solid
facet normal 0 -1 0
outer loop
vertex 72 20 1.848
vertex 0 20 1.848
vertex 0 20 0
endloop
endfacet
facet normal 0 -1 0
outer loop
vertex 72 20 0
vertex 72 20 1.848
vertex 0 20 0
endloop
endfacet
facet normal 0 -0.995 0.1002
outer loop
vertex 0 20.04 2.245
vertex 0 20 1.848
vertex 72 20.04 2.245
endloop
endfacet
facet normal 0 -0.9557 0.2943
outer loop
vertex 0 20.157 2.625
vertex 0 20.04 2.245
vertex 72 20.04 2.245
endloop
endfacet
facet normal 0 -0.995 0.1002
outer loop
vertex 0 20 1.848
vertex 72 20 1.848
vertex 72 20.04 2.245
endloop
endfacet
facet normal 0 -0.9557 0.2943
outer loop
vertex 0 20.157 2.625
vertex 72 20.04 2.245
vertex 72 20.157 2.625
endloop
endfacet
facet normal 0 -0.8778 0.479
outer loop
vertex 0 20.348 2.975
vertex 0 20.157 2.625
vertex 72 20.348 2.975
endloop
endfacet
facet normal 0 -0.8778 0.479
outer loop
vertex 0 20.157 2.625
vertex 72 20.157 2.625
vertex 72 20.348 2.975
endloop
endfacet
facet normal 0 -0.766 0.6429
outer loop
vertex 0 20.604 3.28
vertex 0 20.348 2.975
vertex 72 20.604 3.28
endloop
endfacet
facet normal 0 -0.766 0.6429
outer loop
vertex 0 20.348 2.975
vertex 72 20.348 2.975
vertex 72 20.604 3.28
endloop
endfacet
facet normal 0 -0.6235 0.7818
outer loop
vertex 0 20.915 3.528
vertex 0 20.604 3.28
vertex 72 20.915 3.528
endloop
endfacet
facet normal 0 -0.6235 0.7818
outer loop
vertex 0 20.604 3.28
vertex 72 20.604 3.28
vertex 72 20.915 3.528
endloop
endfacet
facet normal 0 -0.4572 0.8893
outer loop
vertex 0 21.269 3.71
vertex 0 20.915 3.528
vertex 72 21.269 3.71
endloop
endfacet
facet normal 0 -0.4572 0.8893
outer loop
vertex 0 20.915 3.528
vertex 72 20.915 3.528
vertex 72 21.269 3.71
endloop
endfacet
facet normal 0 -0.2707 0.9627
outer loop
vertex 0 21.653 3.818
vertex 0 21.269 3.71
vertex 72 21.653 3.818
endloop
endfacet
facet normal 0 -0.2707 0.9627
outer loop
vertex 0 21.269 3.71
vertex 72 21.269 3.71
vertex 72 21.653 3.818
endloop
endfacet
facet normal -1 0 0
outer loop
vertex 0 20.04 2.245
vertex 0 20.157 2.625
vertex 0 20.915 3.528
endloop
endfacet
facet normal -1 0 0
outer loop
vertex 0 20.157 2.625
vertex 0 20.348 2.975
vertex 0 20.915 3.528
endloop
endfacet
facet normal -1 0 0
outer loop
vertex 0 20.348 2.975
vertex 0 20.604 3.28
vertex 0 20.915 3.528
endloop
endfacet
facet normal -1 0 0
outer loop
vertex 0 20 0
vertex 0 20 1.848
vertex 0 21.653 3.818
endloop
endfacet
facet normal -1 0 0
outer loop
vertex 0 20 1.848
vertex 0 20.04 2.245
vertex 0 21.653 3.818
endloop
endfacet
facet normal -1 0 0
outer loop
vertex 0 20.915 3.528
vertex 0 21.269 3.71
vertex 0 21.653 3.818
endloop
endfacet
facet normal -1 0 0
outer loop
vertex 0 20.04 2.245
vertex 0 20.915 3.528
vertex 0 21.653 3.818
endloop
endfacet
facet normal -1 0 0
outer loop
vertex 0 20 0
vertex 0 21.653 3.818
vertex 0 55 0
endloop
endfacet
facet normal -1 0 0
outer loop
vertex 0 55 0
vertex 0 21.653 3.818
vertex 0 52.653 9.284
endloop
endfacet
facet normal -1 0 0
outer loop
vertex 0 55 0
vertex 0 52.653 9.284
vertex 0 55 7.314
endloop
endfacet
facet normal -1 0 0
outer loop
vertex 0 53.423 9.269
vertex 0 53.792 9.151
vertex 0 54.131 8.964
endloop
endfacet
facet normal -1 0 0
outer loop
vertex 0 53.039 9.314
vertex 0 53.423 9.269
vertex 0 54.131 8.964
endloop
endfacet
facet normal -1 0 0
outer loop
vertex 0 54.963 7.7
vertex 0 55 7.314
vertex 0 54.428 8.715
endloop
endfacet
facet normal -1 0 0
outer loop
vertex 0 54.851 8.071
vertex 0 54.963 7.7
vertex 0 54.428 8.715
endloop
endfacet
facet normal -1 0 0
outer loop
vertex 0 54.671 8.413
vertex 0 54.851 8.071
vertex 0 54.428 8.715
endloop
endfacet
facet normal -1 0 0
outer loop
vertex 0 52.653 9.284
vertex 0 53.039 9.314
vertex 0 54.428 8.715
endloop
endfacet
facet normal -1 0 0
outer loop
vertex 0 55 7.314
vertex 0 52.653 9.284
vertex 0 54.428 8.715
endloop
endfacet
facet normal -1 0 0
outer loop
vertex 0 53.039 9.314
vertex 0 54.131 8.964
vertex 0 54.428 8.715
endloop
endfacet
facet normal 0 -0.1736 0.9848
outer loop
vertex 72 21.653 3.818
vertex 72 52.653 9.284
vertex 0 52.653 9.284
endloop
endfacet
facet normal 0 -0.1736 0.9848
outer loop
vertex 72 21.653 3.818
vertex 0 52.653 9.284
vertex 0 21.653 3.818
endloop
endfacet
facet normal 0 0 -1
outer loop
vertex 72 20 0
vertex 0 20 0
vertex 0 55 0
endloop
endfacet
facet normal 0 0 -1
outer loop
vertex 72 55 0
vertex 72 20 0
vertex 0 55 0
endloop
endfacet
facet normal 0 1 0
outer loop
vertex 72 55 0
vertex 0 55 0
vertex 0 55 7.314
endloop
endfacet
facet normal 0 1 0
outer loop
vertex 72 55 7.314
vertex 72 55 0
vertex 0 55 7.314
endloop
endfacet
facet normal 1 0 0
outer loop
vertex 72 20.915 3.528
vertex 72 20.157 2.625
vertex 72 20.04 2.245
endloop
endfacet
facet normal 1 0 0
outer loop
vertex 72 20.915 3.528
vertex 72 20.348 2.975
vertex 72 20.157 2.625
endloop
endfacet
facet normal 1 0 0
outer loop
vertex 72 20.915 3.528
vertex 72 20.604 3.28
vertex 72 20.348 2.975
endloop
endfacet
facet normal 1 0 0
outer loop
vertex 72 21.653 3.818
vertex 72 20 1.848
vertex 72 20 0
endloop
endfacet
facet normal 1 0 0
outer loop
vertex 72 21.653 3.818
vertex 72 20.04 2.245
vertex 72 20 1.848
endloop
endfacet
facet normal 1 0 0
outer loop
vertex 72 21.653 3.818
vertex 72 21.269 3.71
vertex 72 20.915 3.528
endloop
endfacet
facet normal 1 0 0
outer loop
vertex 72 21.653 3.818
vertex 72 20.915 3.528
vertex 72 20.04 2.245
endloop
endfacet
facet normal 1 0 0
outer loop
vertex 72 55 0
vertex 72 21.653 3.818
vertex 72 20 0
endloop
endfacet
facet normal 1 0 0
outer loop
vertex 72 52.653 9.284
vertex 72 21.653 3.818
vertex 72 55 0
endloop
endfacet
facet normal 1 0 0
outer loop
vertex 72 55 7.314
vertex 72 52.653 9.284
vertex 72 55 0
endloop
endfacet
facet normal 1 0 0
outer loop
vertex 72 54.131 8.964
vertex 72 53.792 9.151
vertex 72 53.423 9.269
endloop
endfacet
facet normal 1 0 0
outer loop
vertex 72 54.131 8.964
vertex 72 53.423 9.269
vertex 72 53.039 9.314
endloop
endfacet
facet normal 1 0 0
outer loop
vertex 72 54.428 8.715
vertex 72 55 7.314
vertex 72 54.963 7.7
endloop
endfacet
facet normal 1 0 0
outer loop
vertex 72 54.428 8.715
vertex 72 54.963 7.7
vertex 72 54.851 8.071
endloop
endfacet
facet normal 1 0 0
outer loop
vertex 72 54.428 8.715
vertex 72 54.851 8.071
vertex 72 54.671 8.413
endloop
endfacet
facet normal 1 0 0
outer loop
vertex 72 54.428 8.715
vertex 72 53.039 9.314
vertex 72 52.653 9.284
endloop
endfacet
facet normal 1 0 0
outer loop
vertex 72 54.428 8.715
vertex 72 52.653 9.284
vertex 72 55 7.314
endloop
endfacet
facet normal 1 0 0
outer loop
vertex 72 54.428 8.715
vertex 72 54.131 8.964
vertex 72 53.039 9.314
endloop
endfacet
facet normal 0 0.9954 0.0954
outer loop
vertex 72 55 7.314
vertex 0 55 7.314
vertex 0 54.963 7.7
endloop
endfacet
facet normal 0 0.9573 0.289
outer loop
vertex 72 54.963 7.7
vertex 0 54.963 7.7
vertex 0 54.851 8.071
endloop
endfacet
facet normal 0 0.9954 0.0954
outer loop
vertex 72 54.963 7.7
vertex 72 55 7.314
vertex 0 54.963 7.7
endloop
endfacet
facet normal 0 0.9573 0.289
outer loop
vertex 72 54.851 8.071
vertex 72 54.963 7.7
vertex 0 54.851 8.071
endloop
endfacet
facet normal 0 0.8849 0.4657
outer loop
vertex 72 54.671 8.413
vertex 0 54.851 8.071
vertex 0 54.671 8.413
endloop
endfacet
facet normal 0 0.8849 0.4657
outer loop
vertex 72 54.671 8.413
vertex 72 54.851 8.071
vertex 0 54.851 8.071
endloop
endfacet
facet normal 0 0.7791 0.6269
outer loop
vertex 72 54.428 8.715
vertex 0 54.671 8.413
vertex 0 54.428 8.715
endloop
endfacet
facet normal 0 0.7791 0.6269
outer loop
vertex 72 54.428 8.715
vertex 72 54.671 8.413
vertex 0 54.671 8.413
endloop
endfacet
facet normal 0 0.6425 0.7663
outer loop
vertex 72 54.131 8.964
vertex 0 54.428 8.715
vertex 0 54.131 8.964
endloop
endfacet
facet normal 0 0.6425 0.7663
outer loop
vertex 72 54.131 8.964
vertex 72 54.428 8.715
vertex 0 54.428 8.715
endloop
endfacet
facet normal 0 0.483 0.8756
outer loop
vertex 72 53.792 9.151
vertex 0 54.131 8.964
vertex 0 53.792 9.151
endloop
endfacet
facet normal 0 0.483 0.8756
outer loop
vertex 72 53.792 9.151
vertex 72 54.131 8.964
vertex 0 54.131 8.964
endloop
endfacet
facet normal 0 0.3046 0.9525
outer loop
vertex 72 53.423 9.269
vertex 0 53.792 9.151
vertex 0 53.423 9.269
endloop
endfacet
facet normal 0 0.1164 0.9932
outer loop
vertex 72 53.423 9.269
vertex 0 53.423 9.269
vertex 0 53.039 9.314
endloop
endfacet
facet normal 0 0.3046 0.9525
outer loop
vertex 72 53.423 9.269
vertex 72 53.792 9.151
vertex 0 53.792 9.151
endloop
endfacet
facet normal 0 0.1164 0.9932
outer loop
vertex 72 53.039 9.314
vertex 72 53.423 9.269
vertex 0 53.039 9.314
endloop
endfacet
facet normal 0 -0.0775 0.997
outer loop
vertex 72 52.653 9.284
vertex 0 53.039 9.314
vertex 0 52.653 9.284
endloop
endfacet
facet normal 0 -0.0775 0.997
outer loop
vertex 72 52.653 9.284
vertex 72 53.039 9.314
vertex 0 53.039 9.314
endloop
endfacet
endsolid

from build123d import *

# Parameters (mm, degrees)
F1_DEPTH = 72
F2_R     = 2


with BuildPart() as f1:
    # F0 (on Right) → F1 (new body)
    with BuildSketch(Plane.YZ):
        Polygon((20, 3.52654), (20, 0), (55, 0), (55, 9.697984), align=None)
    extrude(amount=F1_DEPTH)

    # F2
    f2_edges = [f1.edges().sort_by_distance(p)[0] for p in [
        (36, 55, 9.697984),
        (36, 20, 3.52654),
    ]]
    fillet(f2_edges, radius=F2_R)


solid = f1.part
